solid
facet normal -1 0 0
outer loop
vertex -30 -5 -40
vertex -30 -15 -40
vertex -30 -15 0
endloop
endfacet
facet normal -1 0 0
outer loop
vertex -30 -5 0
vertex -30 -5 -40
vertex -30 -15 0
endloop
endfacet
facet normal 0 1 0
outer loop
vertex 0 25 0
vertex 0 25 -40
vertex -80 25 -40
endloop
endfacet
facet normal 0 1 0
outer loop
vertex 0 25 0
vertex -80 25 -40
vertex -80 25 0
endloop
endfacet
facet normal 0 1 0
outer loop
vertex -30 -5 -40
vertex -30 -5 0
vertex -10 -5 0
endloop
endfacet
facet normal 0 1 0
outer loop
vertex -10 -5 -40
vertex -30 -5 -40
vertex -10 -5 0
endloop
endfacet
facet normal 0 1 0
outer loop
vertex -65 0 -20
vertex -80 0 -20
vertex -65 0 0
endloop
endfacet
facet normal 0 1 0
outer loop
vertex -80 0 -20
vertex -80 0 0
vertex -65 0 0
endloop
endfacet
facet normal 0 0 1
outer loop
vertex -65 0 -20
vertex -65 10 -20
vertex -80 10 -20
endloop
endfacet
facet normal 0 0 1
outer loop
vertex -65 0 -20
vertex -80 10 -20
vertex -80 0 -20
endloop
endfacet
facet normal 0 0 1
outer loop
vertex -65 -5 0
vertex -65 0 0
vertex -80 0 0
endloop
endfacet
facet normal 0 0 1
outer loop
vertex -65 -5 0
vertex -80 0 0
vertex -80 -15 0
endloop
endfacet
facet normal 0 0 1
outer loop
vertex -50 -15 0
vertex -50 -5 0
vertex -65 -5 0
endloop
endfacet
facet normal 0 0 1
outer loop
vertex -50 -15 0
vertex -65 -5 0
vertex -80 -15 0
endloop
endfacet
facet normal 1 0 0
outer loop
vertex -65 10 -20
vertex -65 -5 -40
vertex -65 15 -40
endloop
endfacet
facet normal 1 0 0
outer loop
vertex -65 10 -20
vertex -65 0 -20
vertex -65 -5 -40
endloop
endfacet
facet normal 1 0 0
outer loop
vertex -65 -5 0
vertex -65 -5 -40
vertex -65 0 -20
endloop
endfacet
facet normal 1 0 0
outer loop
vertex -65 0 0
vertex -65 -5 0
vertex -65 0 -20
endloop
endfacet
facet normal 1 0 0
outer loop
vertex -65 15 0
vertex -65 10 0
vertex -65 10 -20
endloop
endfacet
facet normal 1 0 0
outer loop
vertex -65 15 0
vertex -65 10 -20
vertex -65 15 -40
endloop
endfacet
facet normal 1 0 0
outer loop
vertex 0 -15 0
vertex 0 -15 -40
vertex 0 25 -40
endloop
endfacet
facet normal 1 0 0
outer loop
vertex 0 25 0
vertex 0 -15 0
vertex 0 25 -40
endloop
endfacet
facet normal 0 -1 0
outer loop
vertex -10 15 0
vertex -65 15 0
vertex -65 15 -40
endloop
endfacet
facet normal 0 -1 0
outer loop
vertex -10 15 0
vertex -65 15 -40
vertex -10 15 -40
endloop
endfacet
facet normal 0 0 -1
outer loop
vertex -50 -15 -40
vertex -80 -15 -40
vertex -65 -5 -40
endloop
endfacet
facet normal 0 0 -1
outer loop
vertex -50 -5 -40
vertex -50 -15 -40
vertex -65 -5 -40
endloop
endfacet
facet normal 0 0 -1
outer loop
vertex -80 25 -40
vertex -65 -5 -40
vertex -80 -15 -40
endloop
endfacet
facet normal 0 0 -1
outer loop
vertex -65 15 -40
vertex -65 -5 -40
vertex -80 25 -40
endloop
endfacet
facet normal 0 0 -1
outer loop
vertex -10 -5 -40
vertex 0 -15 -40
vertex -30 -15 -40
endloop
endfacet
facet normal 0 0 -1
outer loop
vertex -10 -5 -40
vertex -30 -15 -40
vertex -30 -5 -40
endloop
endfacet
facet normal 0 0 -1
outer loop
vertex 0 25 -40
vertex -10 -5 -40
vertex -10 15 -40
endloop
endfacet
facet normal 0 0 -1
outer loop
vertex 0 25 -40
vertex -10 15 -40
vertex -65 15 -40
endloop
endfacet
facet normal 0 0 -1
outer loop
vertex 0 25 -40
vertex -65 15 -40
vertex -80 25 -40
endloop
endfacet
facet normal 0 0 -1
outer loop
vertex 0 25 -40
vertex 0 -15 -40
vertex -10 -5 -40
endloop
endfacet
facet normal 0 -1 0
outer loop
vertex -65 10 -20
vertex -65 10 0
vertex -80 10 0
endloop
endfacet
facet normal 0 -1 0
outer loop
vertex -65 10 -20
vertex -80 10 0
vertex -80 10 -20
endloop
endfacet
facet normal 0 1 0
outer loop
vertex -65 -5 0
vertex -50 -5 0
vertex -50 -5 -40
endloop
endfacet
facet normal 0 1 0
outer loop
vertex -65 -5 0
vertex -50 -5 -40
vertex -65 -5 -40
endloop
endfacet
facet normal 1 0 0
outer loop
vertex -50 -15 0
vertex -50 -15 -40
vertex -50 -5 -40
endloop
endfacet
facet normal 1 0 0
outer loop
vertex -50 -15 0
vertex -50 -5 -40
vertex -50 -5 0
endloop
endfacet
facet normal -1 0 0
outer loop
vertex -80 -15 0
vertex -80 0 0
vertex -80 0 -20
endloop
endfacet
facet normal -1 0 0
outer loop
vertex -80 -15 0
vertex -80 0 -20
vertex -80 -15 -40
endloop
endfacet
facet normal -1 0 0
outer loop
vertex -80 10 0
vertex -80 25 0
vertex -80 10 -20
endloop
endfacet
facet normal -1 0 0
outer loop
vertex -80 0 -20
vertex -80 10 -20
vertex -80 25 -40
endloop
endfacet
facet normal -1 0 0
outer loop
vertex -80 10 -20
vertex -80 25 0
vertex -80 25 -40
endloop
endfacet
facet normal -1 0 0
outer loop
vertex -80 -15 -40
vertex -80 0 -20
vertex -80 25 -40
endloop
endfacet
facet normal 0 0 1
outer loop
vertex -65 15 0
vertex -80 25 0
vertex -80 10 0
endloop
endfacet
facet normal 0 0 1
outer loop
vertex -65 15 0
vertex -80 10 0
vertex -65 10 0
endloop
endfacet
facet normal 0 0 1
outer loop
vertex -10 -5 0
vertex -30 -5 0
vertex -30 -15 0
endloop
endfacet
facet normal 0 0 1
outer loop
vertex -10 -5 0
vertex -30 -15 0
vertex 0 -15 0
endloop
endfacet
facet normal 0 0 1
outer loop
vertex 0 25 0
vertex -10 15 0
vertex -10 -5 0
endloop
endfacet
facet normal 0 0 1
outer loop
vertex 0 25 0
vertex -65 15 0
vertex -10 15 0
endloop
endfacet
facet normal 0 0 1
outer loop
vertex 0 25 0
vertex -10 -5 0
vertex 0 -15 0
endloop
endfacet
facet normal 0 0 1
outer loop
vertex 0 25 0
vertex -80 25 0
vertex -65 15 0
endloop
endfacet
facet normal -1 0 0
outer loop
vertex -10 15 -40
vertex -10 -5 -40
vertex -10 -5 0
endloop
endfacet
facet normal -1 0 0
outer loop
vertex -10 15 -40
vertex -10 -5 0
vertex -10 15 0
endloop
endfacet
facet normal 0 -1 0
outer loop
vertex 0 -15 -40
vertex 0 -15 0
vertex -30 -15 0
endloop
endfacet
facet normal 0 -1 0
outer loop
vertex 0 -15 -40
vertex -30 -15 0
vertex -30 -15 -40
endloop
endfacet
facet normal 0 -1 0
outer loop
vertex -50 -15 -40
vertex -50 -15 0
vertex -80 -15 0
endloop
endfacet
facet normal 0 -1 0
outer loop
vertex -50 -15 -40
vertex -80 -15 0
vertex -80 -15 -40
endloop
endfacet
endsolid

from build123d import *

# Parameters (mm, degrees)
BOSS_EXTRUDE1_DEPTH = 80
SKETCH3_W           = 20
SKETCH3_H           = 40
CUT_EXTRUDE1_DEPTH  = 25
SKETCH4_W           = 55
SKETCH4_H           = 5
CUT_EXTRUDE2_DEPTH  = 40
SKETCH6_W           = 20
SKETCH6_H           = 5
CUT_EXTRUDE3_DEPTH  = 40
SKETCH7_W           = 20
SKETCH7_H           = 10
CUT_EXTRUDE4_DEPTH  = 20
SKETCH8_W           = 10
SKETCH8_H           = 10
BOSS_EXTRUDE2_DEPTH = 20
SKETCH9_W           = 15
SKETCH9_H           = 10
CUT_EXTRUDE5_DEPTH  = 20
SKETCH11_W          = 15
SKETCH11_H          = 5
CUT_EXTRUDE6_DEPTH  = 40


with BuildPart() as part:
    # Sketch1 → Boss-Extrude1 (new body)
    with BuildSketch(Plane(origin=(0, 0, 0), x_dir=(0, 0, -1), z_dir=(1, 0, 0))):
        Polygon((0, 0), (0, -15), (40, -15), (40, 25), (0, 25), (0, 10), (20, 10), (20, 0), align=None)
    extrude(amount=-BOSS_EXTRUDE1_DEPTH)

    # Sketch3 → Cut-Extrude1 (cut)
    with BuildSketch(Plane.XZ.offset(15)):
        with Locations((-40, -20)):
            Rectangle(SKETCH3_W, SKETCH3_H)
    extrude(amount=-CUT_EXTRUDE1_DEPTH, mode=Mode.SUBTRACT)

    # Sketch4 → Cut-Extrude2 (cut)
    with BuildSketch(Plane.XY):
        with Locations((-37.5, 12.5)):
            Rectangle(SKETCH4_W, SKETCH4_H)
    extrude(amount=-CUT_EXTRUDE2_DEPTH, mode=Mode.SUBTRACT)

    # Sketch6 → Cut-Extrude3 (cut)
    with BuildSketch(Plane.XY):
        with Locations((-20, -2.5)):
            Rectangle(SKETCH6_W, SKETCH6_H)
    extrude(amount=-CUT_EXTRUDE3_DEPTH, mode=Mode.SUBTRACT)

    # Sketch7 → Cut-Extrude4 (cut)
    with BuildSketch(Plane.XY.offset(-20)):
        with Locations((-20, 5)):
            Rectangle(SKETCH7_W, SKETCH7_H)
    extrude(amount=-CUT_EXTRUDE4_DEPTH, mode=Mode.SUBTRACT)

    # Sketch8 → Boss-Extrude2 (add)
    with BuildSketch(Plane.XY.offset(-20)):
        with Locations((-5, 5)):
            Rectangle(SKETCH8_W, SKETCH8_H)
    extrude(amount=BOSS_EXTRUDE2_DEPTH)

    # Sketch9 → Cut-Extrude5 (cut)
    with BuildSketch(Plane.XY.offset(-20)):
        with Locations((-57.5, 5)):
            Rectangle(SKETCH9_W, SKETCH9_H)
    extrude(amount=-CUT_EXTRUDE5_DEPTH, mode=Mode.SUBTRACT)

    # Sketch11 → Cut-Extrude6 (cut)
    with BuildSketch(Plane(origin=(0, 0, -40), x_dir=(-1, 0, 0), z_dir=(0, 0, -1))):
        with Locations((57.5, -2.5)):
            Rectangle(SKETCH11_W, SKETCH11_H)
    extrude(amount=-CUT_EXTRUDE6_DEPTH, mode=Mode.SUBTRACT)


solid = part.part
